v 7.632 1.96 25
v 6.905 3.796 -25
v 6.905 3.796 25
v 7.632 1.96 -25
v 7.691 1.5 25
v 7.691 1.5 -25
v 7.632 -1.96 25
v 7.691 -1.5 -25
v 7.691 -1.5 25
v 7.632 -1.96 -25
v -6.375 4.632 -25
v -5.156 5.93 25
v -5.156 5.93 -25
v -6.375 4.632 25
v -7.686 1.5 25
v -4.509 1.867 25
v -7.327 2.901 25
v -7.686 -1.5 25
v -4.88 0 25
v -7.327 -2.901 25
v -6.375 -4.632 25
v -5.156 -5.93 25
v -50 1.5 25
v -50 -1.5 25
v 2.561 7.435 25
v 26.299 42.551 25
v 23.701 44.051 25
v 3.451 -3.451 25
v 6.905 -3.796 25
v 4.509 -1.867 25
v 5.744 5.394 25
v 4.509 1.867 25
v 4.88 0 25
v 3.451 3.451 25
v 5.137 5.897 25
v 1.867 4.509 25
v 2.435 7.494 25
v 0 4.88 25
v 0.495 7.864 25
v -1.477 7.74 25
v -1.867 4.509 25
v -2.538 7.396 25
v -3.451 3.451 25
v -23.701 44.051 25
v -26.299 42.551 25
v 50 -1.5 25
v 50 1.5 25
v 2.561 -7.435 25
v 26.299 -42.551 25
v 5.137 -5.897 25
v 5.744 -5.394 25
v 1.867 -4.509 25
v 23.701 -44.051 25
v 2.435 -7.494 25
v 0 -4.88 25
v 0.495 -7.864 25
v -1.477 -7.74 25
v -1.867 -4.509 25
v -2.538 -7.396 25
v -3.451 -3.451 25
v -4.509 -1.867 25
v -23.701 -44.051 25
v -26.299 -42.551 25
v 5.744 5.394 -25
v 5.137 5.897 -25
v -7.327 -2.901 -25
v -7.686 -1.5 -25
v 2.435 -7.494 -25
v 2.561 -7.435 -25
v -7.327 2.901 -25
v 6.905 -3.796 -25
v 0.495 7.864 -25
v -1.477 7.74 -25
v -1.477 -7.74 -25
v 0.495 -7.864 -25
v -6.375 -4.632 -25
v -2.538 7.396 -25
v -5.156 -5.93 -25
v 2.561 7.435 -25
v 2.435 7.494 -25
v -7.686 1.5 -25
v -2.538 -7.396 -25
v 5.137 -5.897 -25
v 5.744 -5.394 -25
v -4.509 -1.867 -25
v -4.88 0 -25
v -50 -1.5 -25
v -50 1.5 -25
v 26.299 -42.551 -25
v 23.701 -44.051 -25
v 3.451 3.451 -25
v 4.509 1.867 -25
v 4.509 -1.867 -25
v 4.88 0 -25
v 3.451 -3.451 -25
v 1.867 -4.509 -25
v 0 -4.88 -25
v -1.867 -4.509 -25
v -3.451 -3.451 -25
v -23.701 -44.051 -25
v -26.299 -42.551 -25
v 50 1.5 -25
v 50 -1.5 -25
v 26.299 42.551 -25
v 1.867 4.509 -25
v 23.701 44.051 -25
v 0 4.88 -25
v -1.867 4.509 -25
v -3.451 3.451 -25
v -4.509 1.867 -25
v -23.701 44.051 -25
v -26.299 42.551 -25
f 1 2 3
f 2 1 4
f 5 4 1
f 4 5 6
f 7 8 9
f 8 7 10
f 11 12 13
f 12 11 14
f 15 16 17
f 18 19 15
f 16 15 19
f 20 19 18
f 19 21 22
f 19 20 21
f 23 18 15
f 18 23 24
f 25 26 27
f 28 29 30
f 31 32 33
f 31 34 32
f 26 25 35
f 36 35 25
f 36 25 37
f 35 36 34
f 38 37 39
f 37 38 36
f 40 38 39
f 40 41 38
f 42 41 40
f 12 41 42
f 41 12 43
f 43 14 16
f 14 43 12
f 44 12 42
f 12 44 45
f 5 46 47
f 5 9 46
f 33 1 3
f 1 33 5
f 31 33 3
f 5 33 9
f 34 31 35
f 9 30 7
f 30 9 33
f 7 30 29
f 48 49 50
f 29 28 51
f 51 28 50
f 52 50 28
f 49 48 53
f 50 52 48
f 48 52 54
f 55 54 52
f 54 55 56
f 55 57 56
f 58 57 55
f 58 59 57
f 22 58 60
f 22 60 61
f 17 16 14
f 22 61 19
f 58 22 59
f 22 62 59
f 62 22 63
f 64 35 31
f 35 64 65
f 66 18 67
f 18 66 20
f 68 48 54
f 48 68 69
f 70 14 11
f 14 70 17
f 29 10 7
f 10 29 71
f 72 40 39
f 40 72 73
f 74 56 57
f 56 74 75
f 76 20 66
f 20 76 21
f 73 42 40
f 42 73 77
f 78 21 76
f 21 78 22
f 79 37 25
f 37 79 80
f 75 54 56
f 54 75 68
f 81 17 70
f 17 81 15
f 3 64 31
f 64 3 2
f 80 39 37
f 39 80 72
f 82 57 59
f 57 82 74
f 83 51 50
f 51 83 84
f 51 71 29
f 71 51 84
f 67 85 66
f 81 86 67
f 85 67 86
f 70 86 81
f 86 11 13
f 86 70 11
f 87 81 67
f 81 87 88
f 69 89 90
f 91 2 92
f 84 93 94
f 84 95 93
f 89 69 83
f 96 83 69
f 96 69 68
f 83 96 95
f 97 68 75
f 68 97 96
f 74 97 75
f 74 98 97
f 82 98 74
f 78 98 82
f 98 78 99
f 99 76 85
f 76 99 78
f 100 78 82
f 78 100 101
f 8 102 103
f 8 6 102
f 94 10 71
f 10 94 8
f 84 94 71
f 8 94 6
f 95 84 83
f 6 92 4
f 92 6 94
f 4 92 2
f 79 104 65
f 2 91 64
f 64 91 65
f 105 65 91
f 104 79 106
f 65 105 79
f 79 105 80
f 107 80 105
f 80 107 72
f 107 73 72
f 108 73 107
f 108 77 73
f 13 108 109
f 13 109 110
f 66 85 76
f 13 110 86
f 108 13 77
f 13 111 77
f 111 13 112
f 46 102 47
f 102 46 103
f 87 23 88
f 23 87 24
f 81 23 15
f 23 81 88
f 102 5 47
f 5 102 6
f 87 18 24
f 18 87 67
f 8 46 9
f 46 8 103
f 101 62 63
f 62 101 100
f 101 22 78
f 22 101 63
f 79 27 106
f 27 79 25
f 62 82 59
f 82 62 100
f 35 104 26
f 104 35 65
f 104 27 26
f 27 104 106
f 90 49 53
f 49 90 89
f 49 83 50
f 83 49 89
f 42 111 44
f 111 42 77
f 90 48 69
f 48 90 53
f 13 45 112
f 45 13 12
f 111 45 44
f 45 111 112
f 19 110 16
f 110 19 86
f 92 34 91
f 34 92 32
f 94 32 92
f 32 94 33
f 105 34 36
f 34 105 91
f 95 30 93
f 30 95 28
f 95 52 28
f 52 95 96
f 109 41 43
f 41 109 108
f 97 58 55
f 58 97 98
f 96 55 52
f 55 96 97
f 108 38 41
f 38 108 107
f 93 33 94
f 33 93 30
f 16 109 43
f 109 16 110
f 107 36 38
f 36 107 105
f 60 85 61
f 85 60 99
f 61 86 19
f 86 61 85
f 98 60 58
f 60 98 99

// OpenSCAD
height = 50;
radius = 4.88;
fin_len = 100;

difference () {
     union() {
	  cylinder (h=height, r=radius+3, center=true);
	  rotate(0) cube([fin_len,3,height], center=true);
	  rotate(60) cube([fin_len,3,height], center=true);
	  rotate(120) cube([fin_len,3,height], center=true);
     }
     cylinder (h=height+1, r=radius, center=true);
}
     
/*
difference () {
     cylinder (h=height, r=radius+3, center=true);
     cylinder (h=height+1, r=radius, center=true);
     }

translate([(fin_len/2)+radius,(fin_len/2)-radius,0]) rotate(30) cube([fin_len,3,height], center=true);
translate([-(fin_len/2)-radius,(fin_len/2)-radius,0]) rotate(-30) cube([fin_len,3,height], center=true);

translate([0,-(fin_len/2)-radius,0]) rotate(90) cube([fin_len,3,height], center=true);
*/
